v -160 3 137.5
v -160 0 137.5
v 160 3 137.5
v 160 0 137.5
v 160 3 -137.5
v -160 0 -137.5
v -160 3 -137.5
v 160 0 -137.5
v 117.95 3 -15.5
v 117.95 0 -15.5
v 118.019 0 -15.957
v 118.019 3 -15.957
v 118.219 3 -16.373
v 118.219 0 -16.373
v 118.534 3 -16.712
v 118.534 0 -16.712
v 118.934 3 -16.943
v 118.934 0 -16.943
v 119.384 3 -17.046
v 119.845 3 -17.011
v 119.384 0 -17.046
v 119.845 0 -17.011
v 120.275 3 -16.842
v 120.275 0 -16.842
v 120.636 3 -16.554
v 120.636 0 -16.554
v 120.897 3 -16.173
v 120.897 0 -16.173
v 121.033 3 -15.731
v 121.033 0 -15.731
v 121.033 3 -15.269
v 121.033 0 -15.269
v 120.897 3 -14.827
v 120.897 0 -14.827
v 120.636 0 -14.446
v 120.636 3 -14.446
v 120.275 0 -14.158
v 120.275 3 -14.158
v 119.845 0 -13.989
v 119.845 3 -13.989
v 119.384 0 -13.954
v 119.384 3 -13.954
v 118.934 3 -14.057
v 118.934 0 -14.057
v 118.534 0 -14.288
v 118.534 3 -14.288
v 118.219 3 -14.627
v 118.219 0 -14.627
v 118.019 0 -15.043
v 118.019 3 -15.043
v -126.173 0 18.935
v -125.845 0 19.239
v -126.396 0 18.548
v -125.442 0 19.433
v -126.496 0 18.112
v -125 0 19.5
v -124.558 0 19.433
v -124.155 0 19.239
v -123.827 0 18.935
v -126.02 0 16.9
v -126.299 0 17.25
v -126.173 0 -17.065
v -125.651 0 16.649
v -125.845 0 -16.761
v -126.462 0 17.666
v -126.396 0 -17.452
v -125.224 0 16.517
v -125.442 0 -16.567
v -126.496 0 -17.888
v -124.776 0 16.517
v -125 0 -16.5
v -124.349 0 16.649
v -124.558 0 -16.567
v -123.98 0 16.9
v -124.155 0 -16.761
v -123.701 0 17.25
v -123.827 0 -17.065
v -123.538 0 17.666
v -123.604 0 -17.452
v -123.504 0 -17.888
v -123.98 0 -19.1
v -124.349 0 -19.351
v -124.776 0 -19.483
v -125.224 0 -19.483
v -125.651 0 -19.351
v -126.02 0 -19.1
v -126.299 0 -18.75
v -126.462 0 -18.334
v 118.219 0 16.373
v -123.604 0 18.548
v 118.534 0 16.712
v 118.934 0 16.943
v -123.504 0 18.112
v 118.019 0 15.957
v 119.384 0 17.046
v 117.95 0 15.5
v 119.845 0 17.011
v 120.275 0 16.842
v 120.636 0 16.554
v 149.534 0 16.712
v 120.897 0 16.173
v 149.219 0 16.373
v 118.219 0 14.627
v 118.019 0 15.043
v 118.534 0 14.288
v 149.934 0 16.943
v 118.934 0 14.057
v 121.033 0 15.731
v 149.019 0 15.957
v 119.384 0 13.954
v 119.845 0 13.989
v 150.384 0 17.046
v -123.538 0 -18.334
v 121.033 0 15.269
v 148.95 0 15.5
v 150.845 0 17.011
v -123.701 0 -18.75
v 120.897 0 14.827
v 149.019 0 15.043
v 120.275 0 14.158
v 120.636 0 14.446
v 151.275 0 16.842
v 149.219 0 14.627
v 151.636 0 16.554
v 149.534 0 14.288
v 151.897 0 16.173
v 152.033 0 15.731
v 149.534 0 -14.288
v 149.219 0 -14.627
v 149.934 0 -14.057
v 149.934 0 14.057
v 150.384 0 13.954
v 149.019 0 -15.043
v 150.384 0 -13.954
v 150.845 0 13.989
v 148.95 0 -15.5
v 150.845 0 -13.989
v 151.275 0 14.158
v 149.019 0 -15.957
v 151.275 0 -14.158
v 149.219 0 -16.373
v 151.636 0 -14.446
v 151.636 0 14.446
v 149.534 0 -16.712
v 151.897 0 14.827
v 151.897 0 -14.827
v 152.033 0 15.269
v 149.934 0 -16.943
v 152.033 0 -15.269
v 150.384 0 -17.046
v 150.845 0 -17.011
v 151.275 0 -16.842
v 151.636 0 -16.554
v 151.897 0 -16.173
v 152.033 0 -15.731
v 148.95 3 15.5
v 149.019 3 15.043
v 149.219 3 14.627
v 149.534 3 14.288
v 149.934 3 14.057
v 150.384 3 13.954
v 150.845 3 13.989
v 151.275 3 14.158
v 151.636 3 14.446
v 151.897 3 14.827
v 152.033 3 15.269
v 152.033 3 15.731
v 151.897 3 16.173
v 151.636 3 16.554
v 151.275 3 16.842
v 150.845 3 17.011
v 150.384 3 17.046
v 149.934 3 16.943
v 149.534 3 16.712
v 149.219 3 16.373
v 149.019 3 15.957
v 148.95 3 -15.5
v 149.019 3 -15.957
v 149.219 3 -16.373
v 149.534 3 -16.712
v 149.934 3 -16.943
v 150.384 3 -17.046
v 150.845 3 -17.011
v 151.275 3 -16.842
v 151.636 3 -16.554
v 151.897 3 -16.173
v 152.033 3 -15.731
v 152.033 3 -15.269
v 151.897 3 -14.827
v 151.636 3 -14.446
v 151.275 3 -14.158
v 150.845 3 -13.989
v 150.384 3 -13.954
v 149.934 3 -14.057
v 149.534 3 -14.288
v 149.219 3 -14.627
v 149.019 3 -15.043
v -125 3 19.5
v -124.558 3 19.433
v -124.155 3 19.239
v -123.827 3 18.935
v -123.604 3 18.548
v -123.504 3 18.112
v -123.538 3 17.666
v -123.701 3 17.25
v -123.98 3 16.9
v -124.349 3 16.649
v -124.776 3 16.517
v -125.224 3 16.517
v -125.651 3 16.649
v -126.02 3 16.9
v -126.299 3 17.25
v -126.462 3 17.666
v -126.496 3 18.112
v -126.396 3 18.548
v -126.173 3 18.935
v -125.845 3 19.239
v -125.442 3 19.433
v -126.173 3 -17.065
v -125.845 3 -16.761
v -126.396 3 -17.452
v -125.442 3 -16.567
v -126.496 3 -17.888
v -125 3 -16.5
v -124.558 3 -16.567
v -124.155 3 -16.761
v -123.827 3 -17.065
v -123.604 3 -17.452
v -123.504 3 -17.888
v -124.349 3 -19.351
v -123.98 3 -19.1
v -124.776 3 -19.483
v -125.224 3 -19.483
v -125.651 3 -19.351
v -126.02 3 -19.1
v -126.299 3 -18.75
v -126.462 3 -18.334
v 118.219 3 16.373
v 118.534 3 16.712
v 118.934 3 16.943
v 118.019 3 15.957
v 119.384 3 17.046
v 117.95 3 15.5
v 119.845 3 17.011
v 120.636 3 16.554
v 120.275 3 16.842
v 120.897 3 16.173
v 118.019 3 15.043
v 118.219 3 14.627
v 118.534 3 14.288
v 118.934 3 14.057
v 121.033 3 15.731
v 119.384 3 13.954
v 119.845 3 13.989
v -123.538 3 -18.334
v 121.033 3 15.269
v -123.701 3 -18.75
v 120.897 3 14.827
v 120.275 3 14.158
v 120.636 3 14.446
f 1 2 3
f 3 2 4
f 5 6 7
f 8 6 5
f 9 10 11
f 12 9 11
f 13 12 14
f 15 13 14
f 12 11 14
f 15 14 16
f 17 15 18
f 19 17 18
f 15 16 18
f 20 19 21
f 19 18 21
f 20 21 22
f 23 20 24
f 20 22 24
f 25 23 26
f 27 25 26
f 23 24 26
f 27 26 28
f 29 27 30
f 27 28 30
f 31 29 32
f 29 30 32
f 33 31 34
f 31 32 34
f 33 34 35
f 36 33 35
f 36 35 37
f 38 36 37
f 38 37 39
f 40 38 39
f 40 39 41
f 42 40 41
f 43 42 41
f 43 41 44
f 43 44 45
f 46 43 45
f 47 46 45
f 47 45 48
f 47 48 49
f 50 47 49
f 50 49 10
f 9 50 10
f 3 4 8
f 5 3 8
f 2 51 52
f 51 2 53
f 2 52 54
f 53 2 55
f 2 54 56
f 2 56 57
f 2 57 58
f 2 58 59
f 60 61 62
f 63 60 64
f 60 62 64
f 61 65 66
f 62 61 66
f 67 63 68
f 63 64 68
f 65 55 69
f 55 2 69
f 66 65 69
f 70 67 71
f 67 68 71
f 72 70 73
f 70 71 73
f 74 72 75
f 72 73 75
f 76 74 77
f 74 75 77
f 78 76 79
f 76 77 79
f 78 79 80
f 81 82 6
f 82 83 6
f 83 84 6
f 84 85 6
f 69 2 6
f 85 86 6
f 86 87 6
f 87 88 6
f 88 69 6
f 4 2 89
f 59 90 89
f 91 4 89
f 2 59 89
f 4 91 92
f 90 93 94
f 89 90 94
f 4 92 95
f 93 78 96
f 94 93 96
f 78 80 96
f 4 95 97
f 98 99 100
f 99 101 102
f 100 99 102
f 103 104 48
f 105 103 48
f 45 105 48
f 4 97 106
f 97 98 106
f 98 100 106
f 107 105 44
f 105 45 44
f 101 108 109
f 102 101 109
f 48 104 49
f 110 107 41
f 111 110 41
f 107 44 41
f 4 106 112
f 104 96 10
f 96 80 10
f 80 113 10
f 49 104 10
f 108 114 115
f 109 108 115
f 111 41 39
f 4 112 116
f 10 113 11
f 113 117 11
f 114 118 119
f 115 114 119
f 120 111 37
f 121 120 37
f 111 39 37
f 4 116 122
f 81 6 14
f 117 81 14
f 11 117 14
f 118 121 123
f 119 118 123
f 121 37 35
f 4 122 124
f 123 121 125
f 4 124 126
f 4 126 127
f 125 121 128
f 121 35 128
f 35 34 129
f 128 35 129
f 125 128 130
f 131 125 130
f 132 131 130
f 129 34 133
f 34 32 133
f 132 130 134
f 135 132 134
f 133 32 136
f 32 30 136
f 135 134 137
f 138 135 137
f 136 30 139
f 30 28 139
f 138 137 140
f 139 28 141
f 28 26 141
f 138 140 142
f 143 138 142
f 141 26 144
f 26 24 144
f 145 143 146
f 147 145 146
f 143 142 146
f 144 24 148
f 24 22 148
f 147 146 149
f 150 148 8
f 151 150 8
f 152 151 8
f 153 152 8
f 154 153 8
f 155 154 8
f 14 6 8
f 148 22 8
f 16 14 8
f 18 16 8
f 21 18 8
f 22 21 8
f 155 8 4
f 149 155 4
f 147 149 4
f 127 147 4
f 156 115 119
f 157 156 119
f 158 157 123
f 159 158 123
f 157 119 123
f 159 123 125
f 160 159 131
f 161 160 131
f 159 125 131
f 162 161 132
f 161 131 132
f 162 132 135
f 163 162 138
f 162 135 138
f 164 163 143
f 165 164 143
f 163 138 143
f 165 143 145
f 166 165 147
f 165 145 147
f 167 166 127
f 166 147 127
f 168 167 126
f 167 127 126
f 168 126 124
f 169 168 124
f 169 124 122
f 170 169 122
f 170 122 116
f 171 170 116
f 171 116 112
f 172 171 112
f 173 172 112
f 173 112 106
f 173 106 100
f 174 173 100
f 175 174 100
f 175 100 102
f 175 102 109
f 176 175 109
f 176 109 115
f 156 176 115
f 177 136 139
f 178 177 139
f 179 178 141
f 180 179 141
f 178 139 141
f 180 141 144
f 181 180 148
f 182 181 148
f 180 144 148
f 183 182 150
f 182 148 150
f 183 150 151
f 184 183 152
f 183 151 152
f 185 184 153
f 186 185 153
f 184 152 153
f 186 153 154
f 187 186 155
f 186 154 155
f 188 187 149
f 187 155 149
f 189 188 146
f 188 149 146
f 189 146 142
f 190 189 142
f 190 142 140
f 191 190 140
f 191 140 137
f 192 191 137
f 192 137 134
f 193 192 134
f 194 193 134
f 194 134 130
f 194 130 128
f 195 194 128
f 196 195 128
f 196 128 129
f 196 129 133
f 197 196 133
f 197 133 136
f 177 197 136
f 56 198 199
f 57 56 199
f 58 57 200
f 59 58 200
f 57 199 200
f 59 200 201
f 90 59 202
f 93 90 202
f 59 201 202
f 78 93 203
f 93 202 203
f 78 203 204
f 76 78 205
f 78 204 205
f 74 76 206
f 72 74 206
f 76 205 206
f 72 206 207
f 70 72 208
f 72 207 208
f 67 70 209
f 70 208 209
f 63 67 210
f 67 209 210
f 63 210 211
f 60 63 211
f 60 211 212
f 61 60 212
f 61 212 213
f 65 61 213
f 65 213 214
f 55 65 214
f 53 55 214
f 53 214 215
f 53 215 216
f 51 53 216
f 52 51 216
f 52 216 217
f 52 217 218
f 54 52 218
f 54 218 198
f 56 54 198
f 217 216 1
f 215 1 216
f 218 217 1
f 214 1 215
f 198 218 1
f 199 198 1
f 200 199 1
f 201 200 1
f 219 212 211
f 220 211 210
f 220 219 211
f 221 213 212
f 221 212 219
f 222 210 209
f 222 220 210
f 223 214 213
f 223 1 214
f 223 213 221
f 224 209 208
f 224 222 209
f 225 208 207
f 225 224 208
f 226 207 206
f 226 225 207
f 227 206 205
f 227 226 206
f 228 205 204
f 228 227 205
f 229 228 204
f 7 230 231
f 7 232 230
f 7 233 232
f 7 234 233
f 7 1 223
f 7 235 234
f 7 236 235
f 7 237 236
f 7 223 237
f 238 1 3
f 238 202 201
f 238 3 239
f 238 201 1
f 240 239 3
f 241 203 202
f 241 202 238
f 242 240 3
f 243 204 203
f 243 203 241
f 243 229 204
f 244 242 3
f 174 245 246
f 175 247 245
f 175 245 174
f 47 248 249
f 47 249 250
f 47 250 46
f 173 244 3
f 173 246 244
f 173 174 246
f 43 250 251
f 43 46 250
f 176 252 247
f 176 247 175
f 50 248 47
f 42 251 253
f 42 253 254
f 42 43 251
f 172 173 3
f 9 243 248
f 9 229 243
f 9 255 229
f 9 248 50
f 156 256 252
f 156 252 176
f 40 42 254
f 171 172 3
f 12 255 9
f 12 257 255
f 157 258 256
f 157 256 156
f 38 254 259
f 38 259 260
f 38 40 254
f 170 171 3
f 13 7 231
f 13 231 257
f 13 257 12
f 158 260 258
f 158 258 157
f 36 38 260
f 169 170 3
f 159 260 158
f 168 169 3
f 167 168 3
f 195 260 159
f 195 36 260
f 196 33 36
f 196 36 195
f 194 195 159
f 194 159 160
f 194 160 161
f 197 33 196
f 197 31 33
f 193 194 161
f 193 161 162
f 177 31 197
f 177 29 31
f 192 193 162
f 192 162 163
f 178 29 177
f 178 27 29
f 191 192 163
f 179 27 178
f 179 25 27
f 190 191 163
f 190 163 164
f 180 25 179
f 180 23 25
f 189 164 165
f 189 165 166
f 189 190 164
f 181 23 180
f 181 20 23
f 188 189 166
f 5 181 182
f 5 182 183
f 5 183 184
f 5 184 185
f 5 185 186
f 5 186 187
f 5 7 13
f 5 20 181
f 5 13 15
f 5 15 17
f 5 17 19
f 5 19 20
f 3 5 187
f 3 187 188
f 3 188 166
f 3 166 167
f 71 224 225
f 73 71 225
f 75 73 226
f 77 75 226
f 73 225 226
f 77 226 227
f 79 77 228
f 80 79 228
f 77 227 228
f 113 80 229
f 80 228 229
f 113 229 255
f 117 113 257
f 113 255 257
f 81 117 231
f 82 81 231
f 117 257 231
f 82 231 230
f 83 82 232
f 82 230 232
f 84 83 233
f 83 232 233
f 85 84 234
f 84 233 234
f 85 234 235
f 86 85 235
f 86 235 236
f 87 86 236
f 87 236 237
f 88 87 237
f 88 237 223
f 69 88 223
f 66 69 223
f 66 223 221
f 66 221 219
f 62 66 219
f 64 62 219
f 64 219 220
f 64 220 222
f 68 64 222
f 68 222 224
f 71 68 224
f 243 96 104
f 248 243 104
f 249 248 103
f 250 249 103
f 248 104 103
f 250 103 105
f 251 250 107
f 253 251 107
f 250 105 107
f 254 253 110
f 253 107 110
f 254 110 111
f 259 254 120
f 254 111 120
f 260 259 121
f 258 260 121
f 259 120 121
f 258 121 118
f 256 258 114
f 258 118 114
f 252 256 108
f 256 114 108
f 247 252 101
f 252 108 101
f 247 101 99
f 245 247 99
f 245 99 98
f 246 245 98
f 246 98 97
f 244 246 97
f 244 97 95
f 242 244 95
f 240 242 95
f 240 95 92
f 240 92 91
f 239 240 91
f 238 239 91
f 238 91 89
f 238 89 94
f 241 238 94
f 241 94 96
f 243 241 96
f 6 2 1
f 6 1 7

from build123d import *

# Parameters (mm, degrees)
SKETCH1_W                      = 320
SKETCH1_H                      = 275
BOSS_EXTRUDE1_DEPTH            = 3
TALADRO_DE_MARGEN_PARA_M2_51_D = 3.1
SKETCH6_R                      = 1.5
CUT_EXTRUDE1_DEPTH             = 211.986373968


with BuildPart() as part:
    # Sketch1 → Boss-Extrude1 (new body)
    with BuildSketch(Plane(origin=(0, 0, 0), x_dir=(1, 0, 0), z_dir=(0, 1, 0))):
        Rectangle(SKETCH1_W, SKETCH1_H)
    extrude(amount=BOSS_EXTRUDE1_DEPTH)

    # Taladro de margen para M2.51 (through all)
    with Locations(Plane(origin=(0, 3, 0), x_dir=(1, 0, 0), z_dir=(0, 1, 0))):
        with Locations((150.5, 15.5), (150.5, -15.5), (119.5, -15.5), (119.5, 15.5)):
            Hole(TALADRO_DE_MARGEN_PARA_M2_51_D / 2)

    # Sketch6 → Cut-Extrude1 (cut, through all)
    with BuildSketch(Plane(origin=(0, 3, 0), x_dir=(1, 0, 0), z_dir=(0, 1, 0))):
        with Locations(Location((-125, -18, 0), (0, 0, 270))):
            Circle(SKETCH6_R)
        with Locations(Location((-125, 18, 0), (0, 0, 270))):
            Circle(SKETCH6_R)
    extrude(amount=-CUT_EXTRUDE1_DEPTH, mode=Mode.SUBTRACT)


solid = part.part
